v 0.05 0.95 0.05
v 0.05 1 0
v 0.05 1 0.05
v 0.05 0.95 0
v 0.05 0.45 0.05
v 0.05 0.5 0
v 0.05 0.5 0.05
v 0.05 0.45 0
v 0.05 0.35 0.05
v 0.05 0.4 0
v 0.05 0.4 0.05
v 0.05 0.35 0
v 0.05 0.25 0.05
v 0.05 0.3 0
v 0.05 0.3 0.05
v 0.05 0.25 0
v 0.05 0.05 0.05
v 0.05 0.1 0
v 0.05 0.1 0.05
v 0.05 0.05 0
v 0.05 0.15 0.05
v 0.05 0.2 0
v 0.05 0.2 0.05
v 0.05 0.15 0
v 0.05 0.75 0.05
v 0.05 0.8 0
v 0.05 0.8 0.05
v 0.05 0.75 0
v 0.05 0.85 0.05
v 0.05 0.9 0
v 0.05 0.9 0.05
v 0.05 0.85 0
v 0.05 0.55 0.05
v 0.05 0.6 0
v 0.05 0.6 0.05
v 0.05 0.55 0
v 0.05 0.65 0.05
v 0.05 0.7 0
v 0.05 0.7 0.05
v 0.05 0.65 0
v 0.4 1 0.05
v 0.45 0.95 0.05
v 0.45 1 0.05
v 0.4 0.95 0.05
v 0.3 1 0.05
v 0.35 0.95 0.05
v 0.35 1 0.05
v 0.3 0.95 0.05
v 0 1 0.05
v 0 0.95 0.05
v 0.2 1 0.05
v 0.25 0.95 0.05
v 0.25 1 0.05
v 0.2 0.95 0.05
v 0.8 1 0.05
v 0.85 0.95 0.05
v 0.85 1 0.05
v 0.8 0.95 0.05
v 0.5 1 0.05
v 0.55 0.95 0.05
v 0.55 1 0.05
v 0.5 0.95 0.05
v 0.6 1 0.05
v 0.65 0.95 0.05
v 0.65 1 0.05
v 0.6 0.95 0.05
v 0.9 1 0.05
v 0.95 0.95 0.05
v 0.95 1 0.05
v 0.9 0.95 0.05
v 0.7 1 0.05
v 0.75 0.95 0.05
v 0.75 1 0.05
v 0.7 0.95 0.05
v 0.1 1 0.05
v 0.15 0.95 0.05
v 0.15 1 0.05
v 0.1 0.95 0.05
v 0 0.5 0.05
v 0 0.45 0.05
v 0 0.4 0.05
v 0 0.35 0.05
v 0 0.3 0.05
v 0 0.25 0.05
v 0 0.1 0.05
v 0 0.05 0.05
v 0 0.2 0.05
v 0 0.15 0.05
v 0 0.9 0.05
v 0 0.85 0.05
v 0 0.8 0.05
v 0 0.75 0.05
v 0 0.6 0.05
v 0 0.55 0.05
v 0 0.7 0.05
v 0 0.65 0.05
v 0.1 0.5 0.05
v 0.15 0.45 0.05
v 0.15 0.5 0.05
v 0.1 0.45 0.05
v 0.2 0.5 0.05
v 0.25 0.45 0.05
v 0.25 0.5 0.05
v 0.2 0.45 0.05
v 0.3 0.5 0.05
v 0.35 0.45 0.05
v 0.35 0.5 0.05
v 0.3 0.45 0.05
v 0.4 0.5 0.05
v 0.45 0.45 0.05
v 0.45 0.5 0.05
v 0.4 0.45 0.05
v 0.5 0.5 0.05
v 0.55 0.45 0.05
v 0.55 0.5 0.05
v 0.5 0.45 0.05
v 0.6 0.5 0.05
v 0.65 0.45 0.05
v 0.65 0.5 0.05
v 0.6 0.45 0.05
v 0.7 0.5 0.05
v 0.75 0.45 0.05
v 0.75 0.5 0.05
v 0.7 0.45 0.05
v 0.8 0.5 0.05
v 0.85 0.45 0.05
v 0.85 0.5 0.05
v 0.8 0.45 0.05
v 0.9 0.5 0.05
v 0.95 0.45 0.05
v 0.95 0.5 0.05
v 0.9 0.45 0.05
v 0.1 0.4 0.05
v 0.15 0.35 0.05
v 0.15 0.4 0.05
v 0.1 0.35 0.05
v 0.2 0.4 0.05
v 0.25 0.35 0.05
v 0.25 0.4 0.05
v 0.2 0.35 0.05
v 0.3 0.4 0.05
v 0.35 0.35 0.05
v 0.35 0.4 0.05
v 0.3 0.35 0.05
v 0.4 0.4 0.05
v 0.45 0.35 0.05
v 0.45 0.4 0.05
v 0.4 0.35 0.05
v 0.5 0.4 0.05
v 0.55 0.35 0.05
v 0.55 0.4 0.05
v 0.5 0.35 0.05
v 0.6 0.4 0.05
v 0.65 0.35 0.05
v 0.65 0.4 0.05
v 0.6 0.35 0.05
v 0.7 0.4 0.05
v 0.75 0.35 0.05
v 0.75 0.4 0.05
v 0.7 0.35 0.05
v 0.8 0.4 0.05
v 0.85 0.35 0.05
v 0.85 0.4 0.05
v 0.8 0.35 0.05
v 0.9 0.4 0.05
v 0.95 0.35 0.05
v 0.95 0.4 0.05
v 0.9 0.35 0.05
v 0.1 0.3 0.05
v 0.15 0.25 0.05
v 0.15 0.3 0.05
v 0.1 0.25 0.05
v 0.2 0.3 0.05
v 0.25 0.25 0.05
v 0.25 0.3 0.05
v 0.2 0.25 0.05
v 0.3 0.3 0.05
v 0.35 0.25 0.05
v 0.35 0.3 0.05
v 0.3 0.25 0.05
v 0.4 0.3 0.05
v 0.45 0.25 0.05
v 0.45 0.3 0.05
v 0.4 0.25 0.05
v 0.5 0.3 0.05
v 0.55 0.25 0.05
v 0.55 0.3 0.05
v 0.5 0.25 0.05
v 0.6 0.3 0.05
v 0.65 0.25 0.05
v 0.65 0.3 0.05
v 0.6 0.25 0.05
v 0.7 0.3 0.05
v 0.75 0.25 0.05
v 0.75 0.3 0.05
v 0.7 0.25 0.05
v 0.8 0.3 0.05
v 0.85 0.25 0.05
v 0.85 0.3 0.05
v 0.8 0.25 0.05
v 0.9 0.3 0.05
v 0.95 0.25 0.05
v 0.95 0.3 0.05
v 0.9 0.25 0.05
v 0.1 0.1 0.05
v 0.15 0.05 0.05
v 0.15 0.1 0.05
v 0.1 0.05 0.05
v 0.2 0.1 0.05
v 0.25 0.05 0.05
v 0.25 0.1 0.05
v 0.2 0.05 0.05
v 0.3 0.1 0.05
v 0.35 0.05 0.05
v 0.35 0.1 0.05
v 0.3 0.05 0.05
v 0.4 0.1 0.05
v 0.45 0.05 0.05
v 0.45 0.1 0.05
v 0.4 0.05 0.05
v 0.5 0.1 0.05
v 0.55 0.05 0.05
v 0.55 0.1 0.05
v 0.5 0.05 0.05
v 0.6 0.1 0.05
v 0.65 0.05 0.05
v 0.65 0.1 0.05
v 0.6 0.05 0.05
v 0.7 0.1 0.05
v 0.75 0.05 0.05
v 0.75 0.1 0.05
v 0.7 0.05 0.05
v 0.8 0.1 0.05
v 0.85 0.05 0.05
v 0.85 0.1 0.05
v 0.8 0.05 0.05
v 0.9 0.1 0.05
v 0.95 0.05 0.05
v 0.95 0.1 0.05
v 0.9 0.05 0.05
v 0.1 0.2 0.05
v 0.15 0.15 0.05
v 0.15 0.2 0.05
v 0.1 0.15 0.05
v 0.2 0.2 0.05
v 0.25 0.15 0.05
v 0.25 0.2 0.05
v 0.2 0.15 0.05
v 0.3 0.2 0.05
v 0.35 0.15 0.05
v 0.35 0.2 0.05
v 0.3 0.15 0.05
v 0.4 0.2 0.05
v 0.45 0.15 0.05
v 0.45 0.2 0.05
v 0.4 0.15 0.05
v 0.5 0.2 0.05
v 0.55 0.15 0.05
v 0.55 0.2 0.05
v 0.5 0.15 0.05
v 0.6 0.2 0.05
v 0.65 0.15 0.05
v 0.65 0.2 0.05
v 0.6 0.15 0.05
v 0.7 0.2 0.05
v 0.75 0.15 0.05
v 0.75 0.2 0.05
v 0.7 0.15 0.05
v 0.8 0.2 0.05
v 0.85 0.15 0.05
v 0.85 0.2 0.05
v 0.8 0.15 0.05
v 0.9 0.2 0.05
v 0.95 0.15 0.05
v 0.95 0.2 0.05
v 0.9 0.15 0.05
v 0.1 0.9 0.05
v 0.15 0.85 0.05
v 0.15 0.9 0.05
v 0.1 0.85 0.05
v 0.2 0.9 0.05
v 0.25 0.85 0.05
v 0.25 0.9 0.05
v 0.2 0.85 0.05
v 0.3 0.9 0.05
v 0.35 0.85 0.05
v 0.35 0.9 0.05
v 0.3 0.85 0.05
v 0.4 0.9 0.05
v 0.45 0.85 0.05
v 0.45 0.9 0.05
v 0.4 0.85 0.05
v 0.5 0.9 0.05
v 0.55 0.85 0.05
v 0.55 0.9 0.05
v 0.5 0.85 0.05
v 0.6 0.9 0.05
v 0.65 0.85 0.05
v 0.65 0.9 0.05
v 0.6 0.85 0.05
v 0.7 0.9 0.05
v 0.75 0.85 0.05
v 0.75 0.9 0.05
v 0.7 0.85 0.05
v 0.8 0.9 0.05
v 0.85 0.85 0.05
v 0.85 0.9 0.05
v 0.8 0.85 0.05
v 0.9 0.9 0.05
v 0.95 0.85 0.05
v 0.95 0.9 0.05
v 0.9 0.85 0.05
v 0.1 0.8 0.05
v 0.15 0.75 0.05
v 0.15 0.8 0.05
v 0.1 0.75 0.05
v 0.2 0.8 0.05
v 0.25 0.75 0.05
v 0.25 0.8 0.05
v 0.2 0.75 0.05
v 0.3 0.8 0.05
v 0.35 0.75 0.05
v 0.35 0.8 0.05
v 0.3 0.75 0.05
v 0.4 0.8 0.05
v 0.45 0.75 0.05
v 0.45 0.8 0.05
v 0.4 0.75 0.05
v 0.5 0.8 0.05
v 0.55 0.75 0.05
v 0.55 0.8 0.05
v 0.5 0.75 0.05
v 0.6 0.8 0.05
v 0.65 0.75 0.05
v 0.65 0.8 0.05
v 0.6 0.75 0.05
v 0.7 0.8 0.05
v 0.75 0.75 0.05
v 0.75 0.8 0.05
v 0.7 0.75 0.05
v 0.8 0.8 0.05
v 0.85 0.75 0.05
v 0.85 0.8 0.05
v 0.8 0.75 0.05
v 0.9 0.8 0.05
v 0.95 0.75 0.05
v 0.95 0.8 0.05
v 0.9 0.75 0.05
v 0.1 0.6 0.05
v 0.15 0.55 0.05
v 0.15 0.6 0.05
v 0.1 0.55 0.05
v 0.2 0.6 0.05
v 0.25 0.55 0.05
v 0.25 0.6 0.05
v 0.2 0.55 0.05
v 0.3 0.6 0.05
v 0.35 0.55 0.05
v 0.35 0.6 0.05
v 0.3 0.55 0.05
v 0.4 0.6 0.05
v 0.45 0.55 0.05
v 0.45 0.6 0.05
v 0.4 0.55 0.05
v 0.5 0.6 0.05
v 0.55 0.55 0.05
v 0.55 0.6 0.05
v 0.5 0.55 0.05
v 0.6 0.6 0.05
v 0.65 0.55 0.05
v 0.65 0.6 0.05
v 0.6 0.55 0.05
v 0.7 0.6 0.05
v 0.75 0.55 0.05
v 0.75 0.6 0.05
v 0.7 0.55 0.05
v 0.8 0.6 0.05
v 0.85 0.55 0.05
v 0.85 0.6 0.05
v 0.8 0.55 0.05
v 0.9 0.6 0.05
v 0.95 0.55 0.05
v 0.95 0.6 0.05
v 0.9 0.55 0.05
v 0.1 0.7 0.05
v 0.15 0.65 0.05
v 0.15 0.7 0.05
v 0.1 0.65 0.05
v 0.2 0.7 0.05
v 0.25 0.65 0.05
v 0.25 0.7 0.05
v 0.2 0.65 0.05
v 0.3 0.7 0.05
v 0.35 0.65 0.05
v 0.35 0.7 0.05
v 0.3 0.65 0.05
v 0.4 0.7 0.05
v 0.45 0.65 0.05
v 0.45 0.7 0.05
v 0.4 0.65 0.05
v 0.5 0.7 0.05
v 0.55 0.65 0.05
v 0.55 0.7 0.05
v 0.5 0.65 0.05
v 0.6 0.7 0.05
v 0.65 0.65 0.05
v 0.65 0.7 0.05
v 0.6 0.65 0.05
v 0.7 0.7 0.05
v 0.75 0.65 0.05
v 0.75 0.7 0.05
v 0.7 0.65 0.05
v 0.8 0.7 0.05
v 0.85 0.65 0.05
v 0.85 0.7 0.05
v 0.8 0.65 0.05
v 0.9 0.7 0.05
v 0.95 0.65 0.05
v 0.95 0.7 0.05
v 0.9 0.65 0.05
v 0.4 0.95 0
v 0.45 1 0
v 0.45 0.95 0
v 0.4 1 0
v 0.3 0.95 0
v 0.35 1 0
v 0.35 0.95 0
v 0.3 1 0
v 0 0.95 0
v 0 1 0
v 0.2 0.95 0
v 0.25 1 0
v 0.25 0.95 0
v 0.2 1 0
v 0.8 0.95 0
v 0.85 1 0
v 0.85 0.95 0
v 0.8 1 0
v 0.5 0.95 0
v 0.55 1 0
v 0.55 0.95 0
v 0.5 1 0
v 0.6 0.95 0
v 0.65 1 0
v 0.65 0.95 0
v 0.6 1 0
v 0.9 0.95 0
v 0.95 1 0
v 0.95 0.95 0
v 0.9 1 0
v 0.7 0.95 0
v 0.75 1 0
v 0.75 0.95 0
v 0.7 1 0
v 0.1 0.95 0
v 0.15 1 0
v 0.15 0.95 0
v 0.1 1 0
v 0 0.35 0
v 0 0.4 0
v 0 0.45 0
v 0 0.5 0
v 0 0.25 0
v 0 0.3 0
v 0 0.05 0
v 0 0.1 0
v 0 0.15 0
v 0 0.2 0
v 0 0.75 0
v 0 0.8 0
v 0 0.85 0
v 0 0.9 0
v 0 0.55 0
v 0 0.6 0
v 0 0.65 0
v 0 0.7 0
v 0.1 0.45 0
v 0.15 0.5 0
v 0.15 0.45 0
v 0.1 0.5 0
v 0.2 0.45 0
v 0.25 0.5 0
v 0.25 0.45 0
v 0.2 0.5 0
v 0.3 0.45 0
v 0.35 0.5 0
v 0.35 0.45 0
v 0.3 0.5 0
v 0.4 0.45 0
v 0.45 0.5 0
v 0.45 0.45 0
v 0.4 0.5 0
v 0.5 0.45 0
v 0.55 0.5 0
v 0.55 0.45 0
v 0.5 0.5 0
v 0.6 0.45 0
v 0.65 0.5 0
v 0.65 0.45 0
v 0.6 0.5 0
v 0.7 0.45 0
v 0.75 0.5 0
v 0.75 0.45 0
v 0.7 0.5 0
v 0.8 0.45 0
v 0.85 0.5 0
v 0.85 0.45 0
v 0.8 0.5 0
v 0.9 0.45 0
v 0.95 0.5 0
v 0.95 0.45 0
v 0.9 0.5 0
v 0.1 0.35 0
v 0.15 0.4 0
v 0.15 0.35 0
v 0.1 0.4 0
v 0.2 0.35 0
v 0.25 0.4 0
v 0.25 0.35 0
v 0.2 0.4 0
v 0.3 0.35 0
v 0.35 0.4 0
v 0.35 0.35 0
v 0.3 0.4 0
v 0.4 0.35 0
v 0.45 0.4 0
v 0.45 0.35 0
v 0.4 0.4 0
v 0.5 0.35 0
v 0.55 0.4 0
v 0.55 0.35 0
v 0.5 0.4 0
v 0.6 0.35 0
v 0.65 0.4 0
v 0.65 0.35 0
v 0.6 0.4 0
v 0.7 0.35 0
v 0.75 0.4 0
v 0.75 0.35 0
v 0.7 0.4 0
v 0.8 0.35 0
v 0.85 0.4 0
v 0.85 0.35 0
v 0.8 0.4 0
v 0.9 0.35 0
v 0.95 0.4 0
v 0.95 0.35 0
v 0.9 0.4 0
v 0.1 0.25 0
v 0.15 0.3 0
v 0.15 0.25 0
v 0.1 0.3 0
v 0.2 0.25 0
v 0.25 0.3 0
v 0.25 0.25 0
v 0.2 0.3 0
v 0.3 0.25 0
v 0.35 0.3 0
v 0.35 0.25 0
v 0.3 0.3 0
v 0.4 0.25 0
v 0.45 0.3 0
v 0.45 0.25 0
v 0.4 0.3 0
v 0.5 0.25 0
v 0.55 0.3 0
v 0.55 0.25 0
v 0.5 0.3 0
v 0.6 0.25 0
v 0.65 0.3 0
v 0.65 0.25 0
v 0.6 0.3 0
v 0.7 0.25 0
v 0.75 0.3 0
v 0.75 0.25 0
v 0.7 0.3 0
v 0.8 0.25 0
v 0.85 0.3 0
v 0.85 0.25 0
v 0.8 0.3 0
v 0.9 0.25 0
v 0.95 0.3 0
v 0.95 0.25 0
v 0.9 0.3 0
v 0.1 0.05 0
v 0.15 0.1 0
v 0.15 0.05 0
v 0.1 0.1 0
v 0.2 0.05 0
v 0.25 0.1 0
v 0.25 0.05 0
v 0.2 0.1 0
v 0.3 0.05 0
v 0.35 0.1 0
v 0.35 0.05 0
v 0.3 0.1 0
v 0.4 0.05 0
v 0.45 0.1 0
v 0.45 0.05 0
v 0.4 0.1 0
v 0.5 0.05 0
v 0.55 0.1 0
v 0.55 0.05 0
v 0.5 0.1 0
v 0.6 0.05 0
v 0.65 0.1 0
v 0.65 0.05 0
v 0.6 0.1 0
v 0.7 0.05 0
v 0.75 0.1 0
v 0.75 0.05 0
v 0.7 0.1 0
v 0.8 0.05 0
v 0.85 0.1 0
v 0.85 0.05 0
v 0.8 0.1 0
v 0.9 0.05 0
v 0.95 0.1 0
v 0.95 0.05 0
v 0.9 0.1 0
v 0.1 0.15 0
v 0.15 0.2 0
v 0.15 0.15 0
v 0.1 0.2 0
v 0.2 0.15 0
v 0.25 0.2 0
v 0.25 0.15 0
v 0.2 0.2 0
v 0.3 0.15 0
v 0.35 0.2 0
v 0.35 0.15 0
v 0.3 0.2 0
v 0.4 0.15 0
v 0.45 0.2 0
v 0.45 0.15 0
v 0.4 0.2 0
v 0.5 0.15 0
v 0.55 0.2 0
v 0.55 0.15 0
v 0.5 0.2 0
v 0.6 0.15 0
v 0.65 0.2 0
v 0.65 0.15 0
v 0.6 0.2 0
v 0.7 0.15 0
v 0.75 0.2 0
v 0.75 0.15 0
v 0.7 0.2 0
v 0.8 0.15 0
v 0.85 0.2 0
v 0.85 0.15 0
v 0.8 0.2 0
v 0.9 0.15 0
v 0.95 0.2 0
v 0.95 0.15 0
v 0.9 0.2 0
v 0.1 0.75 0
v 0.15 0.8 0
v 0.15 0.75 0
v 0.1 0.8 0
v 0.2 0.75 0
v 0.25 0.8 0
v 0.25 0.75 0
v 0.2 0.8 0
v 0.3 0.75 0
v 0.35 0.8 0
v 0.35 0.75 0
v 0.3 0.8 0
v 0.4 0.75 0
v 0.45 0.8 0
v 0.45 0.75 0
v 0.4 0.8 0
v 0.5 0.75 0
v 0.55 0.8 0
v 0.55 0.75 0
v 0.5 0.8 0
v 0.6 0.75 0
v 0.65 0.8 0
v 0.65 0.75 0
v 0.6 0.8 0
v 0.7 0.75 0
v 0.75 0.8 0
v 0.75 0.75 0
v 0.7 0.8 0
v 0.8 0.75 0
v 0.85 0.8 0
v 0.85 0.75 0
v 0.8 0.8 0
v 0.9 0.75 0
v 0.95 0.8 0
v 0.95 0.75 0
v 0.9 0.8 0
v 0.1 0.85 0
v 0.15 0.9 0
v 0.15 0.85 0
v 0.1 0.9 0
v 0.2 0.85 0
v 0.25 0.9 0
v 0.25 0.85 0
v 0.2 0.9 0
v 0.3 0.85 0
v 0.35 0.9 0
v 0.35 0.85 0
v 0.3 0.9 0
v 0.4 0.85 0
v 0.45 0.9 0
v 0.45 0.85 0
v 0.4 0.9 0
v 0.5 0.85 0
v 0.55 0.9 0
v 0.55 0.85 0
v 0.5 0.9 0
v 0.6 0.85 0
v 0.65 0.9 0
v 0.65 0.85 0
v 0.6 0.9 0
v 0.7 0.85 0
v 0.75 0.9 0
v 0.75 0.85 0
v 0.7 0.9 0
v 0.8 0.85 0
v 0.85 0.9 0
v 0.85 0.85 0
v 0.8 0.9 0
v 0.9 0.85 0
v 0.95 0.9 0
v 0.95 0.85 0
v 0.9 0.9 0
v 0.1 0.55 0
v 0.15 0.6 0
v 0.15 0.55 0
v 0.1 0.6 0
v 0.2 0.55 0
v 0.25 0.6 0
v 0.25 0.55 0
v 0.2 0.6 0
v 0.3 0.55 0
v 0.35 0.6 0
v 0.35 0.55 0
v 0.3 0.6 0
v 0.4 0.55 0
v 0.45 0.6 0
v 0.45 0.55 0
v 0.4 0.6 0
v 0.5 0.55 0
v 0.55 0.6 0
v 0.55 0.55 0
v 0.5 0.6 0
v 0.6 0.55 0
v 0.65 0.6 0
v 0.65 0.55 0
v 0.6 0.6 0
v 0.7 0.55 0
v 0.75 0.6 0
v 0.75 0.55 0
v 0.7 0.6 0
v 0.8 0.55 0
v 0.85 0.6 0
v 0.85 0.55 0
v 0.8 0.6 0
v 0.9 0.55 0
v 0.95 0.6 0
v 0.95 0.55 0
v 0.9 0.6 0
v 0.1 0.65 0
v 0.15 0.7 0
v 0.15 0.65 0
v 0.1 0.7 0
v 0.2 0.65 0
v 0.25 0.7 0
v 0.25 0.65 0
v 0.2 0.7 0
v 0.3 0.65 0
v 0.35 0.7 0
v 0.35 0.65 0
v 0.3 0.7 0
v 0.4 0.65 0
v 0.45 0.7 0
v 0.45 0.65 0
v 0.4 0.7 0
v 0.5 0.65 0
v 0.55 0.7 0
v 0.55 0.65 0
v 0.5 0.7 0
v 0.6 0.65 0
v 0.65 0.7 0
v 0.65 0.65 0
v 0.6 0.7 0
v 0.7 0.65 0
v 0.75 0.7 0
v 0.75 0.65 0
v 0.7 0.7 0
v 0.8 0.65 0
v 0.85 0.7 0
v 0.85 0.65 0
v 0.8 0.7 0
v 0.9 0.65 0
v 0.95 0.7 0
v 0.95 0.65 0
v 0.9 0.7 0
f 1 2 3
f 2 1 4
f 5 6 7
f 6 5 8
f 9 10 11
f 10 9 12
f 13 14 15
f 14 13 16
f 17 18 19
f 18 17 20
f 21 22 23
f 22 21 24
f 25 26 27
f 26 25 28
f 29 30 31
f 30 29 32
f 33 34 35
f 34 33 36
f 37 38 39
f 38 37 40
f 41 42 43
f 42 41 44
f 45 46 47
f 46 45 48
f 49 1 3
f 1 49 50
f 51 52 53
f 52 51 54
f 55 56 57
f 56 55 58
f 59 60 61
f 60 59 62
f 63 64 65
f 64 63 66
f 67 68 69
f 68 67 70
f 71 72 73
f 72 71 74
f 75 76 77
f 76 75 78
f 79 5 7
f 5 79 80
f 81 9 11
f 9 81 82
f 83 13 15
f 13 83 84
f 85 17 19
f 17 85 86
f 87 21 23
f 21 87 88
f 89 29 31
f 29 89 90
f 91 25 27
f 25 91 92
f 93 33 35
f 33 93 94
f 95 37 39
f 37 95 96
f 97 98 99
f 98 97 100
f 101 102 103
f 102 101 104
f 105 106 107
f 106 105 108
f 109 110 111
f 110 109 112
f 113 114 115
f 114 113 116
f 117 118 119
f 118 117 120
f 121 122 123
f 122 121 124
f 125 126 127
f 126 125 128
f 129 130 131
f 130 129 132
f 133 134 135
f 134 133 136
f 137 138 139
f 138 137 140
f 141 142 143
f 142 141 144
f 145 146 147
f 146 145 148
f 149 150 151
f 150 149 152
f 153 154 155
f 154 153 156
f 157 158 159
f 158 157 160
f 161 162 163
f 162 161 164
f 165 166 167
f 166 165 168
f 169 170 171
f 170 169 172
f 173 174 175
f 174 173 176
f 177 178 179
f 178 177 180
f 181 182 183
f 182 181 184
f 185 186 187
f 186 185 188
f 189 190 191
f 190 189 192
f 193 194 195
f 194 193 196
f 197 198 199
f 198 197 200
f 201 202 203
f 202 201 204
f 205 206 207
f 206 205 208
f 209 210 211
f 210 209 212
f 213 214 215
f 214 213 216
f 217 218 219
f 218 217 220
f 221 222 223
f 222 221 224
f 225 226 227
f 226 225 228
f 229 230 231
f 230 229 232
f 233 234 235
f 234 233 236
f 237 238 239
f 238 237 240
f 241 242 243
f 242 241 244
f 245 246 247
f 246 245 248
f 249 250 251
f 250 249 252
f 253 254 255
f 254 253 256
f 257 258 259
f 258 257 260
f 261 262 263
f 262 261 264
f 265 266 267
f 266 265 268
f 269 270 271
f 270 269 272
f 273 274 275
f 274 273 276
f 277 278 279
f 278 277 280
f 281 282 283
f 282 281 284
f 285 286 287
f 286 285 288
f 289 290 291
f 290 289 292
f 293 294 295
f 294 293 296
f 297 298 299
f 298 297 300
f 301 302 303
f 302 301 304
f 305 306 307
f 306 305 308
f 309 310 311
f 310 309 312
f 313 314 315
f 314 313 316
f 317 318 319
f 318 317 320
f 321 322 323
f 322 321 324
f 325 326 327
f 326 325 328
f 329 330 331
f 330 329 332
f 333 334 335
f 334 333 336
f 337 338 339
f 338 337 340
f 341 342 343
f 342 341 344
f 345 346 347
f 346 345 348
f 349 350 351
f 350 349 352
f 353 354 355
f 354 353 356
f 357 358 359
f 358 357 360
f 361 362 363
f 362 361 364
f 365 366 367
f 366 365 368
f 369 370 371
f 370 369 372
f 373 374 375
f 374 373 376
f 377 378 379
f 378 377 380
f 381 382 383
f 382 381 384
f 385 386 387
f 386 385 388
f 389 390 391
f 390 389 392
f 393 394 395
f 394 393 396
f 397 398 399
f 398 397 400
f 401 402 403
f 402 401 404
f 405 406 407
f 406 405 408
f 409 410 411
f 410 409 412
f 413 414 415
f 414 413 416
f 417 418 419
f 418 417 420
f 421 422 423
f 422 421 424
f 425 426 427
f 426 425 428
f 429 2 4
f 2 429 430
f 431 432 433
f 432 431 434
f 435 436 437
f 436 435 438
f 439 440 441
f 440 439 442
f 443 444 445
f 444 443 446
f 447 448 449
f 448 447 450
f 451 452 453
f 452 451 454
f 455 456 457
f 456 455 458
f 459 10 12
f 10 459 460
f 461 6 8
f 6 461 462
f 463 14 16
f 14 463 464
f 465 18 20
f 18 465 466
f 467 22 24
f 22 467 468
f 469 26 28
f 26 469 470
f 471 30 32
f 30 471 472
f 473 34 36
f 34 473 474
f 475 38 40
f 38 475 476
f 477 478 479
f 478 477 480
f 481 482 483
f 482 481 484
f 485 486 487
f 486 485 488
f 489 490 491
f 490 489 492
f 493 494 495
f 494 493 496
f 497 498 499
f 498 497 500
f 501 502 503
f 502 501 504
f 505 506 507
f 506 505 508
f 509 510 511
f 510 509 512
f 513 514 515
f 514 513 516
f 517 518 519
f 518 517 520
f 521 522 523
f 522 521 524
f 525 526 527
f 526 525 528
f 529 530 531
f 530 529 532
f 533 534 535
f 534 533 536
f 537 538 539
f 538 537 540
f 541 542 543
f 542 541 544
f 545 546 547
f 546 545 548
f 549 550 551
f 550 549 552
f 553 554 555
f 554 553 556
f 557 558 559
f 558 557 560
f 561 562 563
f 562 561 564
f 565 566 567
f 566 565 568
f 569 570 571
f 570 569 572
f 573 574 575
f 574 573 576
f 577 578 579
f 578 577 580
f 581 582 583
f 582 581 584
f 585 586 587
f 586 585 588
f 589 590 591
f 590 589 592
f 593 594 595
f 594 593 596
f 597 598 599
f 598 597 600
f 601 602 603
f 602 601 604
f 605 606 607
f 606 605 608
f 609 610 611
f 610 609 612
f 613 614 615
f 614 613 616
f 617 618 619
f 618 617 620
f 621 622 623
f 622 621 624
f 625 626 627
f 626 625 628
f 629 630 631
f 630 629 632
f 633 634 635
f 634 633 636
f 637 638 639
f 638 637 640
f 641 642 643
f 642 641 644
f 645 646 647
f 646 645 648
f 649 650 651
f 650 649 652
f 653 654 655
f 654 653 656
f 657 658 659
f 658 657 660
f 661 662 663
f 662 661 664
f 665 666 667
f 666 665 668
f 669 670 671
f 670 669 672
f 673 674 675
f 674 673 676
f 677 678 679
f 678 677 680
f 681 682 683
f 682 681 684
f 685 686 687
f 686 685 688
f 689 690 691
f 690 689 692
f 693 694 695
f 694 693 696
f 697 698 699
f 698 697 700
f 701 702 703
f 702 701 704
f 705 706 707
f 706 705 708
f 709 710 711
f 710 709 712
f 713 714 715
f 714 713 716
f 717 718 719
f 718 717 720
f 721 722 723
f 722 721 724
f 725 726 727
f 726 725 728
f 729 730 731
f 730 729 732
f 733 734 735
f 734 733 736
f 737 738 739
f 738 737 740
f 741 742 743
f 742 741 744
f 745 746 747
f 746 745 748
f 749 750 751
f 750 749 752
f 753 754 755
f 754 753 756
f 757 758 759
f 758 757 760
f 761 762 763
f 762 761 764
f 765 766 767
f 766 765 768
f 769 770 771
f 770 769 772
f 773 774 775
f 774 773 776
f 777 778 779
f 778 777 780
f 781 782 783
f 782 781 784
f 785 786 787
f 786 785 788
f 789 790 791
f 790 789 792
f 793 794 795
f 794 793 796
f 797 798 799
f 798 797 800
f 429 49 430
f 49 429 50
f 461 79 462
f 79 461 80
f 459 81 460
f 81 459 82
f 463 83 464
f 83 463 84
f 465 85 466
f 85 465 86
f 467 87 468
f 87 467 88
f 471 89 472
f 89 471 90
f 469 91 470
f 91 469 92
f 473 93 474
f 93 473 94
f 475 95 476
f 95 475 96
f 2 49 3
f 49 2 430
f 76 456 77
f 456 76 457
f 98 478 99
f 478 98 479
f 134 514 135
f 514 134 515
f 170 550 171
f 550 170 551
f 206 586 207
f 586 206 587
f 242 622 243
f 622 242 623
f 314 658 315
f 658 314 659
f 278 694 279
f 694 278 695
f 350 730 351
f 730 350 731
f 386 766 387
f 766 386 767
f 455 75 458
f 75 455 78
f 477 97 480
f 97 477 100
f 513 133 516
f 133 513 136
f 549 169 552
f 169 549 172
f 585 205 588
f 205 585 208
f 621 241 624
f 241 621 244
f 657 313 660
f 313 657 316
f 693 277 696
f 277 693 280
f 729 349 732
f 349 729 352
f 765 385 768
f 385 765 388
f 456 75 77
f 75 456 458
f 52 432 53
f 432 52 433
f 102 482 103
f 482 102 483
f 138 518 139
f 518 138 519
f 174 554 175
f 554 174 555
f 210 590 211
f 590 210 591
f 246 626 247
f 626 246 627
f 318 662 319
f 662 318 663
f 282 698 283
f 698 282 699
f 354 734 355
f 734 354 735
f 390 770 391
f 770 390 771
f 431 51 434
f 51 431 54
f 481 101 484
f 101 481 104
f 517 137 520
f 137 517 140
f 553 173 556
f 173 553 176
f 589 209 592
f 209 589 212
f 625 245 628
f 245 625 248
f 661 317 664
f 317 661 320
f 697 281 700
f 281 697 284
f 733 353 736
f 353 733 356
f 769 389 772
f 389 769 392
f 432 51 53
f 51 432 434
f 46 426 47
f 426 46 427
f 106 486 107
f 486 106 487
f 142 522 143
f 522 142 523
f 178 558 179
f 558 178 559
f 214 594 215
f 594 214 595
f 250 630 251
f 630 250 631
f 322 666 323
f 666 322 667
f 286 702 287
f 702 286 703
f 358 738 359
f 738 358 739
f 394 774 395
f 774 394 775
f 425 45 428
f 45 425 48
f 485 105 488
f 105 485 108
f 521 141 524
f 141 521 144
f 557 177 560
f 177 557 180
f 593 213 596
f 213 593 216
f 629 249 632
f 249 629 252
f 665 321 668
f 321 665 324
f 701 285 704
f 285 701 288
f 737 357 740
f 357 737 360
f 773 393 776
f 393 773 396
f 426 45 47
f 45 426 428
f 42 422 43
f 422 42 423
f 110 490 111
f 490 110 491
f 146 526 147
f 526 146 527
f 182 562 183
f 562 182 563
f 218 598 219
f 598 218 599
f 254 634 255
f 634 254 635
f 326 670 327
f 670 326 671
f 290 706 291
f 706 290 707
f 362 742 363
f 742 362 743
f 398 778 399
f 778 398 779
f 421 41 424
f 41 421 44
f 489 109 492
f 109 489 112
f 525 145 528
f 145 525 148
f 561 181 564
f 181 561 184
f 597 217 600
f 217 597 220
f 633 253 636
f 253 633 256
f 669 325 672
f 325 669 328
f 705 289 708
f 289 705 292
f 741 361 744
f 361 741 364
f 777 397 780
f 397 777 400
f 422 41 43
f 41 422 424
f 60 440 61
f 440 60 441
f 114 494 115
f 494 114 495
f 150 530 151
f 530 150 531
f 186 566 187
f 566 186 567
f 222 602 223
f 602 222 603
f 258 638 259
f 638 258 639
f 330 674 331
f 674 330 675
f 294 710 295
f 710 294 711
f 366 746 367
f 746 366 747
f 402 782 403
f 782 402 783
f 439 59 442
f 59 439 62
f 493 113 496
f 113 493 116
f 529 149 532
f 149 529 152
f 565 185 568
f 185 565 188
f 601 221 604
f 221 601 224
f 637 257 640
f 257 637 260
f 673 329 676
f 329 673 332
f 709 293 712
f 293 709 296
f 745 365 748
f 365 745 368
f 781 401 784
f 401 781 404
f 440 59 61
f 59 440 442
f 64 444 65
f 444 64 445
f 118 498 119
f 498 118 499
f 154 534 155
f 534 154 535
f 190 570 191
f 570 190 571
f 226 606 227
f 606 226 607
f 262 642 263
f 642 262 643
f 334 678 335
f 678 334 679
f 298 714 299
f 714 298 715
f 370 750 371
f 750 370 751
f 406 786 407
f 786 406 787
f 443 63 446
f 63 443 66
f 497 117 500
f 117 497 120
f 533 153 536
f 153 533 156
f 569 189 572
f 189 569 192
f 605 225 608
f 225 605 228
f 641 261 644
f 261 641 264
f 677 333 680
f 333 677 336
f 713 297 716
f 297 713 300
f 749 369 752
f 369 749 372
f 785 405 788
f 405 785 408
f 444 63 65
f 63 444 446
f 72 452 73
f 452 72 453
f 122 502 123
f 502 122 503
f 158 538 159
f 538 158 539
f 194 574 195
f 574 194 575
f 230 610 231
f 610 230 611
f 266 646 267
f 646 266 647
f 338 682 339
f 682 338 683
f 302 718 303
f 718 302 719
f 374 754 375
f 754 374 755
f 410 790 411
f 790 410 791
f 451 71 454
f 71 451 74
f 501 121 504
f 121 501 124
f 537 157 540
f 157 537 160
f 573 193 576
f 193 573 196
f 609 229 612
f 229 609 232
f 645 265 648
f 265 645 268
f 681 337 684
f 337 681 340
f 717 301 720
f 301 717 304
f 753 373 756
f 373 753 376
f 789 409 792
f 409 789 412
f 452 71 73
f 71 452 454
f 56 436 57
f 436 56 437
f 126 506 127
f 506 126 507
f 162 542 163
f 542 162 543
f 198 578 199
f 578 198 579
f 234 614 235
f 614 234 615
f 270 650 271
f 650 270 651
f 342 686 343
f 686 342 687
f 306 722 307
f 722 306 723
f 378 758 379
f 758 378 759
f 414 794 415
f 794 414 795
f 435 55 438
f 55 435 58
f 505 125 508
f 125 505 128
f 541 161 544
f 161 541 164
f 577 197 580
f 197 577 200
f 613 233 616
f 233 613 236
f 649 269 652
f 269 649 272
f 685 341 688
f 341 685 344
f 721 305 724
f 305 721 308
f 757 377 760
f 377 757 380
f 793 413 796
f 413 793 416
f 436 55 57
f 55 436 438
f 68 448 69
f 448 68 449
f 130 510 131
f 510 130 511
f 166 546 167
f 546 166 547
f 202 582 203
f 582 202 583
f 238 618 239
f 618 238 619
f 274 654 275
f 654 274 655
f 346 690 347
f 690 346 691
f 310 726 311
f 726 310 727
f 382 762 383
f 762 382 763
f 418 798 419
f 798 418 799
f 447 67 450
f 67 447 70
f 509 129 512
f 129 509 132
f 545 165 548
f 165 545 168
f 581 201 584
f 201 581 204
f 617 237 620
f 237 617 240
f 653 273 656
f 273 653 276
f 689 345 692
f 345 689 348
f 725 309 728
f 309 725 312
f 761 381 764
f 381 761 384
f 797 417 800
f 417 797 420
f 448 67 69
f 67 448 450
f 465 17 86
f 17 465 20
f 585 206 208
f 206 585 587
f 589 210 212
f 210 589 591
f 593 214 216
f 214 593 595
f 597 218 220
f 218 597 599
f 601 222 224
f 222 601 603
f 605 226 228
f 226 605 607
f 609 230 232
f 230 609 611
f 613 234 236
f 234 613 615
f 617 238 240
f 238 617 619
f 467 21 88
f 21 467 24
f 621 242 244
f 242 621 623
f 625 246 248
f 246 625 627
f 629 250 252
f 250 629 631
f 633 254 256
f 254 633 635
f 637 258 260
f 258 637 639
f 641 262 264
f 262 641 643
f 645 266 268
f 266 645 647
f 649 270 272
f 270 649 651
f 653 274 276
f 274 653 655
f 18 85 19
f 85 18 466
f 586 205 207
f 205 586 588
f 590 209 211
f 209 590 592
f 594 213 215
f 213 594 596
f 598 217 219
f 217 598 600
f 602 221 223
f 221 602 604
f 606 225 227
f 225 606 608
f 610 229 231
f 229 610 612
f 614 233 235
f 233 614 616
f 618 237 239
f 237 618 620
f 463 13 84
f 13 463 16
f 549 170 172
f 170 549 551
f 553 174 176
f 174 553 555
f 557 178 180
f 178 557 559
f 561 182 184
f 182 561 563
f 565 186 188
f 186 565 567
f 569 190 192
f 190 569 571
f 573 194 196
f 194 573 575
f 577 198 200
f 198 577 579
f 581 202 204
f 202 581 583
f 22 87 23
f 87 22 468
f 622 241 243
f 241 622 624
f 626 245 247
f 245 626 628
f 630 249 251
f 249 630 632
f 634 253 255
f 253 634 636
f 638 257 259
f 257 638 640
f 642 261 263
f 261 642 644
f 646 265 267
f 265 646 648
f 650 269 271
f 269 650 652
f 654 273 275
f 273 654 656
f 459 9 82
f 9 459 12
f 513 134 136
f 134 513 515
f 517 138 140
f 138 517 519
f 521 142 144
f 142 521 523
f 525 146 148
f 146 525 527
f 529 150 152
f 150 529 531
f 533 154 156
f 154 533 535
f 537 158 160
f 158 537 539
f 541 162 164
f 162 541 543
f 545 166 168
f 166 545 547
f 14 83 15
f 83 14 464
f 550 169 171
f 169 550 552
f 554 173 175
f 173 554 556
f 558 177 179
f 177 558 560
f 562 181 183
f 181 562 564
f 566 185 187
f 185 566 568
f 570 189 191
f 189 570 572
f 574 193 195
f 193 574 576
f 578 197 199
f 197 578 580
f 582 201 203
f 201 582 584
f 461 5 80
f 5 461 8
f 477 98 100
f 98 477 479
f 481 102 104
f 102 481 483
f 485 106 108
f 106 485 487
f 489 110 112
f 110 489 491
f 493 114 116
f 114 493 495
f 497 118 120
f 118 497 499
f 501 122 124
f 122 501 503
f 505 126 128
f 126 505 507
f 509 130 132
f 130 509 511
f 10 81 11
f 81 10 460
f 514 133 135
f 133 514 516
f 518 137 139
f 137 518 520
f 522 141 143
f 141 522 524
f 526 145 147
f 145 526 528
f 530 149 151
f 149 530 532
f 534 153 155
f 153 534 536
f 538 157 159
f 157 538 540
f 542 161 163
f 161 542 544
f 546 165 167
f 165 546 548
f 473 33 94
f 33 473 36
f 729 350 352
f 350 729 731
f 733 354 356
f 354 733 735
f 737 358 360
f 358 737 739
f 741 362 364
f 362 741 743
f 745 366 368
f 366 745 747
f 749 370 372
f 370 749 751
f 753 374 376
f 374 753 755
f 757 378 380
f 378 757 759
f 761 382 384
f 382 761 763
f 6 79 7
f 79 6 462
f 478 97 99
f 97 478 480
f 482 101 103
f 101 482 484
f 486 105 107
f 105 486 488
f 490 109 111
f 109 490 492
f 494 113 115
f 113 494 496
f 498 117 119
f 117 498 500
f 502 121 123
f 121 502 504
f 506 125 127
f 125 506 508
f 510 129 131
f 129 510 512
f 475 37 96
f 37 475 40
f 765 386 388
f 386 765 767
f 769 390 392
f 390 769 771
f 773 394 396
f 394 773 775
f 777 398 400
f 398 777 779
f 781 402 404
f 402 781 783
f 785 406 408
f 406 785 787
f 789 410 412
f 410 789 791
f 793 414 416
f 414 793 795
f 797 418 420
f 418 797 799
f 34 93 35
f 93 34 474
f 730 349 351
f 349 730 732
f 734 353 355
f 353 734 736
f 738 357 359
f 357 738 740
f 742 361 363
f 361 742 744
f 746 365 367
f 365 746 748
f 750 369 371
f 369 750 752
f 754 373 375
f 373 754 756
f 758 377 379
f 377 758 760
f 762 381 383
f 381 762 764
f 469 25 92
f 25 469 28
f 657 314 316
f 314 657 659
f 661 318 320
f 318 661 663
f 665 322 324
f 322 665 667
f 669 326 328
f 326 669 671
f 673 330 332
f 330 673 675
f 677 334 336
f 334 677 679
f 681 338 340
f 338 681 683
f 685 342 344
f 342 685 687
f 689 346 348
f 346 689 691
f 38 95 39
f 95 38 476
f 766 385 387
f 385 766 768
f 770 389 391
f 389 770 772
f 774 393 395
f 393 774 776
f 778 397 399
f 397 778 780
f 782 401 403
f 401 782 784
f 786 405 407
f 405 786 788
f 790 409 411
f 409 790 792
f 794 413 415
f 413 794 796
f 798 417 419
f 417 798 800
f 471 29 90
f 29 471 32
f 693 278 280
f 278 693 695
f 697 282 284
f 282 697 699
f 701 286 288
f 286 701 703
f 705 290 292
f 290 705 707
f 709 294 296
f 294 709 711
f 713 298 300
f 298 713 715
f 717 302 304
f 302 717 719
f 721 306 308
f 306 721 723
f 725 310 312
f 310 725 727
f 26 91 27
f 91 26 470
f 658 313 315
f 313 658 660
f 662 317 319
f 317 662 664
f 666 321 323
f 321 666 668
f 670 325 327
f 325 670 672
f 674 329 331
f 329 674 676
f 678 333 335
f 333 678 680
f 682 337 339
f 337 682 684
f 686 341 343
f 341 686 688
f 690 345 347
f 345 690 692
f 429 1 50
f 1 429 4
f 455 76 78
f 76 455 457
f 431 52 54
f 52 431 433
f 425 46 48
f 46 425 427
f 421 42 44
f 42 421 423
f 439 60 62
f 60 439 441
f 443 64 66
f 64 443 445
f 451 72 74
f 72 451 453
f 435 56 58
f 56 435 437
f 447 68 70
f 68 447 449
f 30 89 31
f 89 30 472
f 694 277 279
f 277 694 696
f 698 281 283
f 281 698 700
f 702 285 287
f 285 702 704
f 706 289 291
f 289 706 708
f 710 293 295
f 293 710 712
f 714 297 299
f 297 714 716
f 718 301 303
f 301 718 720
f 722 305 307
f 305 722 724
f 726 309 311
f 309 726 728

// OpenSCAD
n=10;
d=1.0/n;

difference() {
   union() {
      for(i=[0:n-1]) {
         translate([i*d, 0.0, 0.0])
            scale([0.5*d, 1.0, 0.5*d])
               cube();
      }
   }
   union() {
      for(i=[0:n-1]) {
         translate([0.0, i*d, 0.0])
           scale([1.0, 0.5*d, 0.5*d])
             cube();
      }
   }
}
